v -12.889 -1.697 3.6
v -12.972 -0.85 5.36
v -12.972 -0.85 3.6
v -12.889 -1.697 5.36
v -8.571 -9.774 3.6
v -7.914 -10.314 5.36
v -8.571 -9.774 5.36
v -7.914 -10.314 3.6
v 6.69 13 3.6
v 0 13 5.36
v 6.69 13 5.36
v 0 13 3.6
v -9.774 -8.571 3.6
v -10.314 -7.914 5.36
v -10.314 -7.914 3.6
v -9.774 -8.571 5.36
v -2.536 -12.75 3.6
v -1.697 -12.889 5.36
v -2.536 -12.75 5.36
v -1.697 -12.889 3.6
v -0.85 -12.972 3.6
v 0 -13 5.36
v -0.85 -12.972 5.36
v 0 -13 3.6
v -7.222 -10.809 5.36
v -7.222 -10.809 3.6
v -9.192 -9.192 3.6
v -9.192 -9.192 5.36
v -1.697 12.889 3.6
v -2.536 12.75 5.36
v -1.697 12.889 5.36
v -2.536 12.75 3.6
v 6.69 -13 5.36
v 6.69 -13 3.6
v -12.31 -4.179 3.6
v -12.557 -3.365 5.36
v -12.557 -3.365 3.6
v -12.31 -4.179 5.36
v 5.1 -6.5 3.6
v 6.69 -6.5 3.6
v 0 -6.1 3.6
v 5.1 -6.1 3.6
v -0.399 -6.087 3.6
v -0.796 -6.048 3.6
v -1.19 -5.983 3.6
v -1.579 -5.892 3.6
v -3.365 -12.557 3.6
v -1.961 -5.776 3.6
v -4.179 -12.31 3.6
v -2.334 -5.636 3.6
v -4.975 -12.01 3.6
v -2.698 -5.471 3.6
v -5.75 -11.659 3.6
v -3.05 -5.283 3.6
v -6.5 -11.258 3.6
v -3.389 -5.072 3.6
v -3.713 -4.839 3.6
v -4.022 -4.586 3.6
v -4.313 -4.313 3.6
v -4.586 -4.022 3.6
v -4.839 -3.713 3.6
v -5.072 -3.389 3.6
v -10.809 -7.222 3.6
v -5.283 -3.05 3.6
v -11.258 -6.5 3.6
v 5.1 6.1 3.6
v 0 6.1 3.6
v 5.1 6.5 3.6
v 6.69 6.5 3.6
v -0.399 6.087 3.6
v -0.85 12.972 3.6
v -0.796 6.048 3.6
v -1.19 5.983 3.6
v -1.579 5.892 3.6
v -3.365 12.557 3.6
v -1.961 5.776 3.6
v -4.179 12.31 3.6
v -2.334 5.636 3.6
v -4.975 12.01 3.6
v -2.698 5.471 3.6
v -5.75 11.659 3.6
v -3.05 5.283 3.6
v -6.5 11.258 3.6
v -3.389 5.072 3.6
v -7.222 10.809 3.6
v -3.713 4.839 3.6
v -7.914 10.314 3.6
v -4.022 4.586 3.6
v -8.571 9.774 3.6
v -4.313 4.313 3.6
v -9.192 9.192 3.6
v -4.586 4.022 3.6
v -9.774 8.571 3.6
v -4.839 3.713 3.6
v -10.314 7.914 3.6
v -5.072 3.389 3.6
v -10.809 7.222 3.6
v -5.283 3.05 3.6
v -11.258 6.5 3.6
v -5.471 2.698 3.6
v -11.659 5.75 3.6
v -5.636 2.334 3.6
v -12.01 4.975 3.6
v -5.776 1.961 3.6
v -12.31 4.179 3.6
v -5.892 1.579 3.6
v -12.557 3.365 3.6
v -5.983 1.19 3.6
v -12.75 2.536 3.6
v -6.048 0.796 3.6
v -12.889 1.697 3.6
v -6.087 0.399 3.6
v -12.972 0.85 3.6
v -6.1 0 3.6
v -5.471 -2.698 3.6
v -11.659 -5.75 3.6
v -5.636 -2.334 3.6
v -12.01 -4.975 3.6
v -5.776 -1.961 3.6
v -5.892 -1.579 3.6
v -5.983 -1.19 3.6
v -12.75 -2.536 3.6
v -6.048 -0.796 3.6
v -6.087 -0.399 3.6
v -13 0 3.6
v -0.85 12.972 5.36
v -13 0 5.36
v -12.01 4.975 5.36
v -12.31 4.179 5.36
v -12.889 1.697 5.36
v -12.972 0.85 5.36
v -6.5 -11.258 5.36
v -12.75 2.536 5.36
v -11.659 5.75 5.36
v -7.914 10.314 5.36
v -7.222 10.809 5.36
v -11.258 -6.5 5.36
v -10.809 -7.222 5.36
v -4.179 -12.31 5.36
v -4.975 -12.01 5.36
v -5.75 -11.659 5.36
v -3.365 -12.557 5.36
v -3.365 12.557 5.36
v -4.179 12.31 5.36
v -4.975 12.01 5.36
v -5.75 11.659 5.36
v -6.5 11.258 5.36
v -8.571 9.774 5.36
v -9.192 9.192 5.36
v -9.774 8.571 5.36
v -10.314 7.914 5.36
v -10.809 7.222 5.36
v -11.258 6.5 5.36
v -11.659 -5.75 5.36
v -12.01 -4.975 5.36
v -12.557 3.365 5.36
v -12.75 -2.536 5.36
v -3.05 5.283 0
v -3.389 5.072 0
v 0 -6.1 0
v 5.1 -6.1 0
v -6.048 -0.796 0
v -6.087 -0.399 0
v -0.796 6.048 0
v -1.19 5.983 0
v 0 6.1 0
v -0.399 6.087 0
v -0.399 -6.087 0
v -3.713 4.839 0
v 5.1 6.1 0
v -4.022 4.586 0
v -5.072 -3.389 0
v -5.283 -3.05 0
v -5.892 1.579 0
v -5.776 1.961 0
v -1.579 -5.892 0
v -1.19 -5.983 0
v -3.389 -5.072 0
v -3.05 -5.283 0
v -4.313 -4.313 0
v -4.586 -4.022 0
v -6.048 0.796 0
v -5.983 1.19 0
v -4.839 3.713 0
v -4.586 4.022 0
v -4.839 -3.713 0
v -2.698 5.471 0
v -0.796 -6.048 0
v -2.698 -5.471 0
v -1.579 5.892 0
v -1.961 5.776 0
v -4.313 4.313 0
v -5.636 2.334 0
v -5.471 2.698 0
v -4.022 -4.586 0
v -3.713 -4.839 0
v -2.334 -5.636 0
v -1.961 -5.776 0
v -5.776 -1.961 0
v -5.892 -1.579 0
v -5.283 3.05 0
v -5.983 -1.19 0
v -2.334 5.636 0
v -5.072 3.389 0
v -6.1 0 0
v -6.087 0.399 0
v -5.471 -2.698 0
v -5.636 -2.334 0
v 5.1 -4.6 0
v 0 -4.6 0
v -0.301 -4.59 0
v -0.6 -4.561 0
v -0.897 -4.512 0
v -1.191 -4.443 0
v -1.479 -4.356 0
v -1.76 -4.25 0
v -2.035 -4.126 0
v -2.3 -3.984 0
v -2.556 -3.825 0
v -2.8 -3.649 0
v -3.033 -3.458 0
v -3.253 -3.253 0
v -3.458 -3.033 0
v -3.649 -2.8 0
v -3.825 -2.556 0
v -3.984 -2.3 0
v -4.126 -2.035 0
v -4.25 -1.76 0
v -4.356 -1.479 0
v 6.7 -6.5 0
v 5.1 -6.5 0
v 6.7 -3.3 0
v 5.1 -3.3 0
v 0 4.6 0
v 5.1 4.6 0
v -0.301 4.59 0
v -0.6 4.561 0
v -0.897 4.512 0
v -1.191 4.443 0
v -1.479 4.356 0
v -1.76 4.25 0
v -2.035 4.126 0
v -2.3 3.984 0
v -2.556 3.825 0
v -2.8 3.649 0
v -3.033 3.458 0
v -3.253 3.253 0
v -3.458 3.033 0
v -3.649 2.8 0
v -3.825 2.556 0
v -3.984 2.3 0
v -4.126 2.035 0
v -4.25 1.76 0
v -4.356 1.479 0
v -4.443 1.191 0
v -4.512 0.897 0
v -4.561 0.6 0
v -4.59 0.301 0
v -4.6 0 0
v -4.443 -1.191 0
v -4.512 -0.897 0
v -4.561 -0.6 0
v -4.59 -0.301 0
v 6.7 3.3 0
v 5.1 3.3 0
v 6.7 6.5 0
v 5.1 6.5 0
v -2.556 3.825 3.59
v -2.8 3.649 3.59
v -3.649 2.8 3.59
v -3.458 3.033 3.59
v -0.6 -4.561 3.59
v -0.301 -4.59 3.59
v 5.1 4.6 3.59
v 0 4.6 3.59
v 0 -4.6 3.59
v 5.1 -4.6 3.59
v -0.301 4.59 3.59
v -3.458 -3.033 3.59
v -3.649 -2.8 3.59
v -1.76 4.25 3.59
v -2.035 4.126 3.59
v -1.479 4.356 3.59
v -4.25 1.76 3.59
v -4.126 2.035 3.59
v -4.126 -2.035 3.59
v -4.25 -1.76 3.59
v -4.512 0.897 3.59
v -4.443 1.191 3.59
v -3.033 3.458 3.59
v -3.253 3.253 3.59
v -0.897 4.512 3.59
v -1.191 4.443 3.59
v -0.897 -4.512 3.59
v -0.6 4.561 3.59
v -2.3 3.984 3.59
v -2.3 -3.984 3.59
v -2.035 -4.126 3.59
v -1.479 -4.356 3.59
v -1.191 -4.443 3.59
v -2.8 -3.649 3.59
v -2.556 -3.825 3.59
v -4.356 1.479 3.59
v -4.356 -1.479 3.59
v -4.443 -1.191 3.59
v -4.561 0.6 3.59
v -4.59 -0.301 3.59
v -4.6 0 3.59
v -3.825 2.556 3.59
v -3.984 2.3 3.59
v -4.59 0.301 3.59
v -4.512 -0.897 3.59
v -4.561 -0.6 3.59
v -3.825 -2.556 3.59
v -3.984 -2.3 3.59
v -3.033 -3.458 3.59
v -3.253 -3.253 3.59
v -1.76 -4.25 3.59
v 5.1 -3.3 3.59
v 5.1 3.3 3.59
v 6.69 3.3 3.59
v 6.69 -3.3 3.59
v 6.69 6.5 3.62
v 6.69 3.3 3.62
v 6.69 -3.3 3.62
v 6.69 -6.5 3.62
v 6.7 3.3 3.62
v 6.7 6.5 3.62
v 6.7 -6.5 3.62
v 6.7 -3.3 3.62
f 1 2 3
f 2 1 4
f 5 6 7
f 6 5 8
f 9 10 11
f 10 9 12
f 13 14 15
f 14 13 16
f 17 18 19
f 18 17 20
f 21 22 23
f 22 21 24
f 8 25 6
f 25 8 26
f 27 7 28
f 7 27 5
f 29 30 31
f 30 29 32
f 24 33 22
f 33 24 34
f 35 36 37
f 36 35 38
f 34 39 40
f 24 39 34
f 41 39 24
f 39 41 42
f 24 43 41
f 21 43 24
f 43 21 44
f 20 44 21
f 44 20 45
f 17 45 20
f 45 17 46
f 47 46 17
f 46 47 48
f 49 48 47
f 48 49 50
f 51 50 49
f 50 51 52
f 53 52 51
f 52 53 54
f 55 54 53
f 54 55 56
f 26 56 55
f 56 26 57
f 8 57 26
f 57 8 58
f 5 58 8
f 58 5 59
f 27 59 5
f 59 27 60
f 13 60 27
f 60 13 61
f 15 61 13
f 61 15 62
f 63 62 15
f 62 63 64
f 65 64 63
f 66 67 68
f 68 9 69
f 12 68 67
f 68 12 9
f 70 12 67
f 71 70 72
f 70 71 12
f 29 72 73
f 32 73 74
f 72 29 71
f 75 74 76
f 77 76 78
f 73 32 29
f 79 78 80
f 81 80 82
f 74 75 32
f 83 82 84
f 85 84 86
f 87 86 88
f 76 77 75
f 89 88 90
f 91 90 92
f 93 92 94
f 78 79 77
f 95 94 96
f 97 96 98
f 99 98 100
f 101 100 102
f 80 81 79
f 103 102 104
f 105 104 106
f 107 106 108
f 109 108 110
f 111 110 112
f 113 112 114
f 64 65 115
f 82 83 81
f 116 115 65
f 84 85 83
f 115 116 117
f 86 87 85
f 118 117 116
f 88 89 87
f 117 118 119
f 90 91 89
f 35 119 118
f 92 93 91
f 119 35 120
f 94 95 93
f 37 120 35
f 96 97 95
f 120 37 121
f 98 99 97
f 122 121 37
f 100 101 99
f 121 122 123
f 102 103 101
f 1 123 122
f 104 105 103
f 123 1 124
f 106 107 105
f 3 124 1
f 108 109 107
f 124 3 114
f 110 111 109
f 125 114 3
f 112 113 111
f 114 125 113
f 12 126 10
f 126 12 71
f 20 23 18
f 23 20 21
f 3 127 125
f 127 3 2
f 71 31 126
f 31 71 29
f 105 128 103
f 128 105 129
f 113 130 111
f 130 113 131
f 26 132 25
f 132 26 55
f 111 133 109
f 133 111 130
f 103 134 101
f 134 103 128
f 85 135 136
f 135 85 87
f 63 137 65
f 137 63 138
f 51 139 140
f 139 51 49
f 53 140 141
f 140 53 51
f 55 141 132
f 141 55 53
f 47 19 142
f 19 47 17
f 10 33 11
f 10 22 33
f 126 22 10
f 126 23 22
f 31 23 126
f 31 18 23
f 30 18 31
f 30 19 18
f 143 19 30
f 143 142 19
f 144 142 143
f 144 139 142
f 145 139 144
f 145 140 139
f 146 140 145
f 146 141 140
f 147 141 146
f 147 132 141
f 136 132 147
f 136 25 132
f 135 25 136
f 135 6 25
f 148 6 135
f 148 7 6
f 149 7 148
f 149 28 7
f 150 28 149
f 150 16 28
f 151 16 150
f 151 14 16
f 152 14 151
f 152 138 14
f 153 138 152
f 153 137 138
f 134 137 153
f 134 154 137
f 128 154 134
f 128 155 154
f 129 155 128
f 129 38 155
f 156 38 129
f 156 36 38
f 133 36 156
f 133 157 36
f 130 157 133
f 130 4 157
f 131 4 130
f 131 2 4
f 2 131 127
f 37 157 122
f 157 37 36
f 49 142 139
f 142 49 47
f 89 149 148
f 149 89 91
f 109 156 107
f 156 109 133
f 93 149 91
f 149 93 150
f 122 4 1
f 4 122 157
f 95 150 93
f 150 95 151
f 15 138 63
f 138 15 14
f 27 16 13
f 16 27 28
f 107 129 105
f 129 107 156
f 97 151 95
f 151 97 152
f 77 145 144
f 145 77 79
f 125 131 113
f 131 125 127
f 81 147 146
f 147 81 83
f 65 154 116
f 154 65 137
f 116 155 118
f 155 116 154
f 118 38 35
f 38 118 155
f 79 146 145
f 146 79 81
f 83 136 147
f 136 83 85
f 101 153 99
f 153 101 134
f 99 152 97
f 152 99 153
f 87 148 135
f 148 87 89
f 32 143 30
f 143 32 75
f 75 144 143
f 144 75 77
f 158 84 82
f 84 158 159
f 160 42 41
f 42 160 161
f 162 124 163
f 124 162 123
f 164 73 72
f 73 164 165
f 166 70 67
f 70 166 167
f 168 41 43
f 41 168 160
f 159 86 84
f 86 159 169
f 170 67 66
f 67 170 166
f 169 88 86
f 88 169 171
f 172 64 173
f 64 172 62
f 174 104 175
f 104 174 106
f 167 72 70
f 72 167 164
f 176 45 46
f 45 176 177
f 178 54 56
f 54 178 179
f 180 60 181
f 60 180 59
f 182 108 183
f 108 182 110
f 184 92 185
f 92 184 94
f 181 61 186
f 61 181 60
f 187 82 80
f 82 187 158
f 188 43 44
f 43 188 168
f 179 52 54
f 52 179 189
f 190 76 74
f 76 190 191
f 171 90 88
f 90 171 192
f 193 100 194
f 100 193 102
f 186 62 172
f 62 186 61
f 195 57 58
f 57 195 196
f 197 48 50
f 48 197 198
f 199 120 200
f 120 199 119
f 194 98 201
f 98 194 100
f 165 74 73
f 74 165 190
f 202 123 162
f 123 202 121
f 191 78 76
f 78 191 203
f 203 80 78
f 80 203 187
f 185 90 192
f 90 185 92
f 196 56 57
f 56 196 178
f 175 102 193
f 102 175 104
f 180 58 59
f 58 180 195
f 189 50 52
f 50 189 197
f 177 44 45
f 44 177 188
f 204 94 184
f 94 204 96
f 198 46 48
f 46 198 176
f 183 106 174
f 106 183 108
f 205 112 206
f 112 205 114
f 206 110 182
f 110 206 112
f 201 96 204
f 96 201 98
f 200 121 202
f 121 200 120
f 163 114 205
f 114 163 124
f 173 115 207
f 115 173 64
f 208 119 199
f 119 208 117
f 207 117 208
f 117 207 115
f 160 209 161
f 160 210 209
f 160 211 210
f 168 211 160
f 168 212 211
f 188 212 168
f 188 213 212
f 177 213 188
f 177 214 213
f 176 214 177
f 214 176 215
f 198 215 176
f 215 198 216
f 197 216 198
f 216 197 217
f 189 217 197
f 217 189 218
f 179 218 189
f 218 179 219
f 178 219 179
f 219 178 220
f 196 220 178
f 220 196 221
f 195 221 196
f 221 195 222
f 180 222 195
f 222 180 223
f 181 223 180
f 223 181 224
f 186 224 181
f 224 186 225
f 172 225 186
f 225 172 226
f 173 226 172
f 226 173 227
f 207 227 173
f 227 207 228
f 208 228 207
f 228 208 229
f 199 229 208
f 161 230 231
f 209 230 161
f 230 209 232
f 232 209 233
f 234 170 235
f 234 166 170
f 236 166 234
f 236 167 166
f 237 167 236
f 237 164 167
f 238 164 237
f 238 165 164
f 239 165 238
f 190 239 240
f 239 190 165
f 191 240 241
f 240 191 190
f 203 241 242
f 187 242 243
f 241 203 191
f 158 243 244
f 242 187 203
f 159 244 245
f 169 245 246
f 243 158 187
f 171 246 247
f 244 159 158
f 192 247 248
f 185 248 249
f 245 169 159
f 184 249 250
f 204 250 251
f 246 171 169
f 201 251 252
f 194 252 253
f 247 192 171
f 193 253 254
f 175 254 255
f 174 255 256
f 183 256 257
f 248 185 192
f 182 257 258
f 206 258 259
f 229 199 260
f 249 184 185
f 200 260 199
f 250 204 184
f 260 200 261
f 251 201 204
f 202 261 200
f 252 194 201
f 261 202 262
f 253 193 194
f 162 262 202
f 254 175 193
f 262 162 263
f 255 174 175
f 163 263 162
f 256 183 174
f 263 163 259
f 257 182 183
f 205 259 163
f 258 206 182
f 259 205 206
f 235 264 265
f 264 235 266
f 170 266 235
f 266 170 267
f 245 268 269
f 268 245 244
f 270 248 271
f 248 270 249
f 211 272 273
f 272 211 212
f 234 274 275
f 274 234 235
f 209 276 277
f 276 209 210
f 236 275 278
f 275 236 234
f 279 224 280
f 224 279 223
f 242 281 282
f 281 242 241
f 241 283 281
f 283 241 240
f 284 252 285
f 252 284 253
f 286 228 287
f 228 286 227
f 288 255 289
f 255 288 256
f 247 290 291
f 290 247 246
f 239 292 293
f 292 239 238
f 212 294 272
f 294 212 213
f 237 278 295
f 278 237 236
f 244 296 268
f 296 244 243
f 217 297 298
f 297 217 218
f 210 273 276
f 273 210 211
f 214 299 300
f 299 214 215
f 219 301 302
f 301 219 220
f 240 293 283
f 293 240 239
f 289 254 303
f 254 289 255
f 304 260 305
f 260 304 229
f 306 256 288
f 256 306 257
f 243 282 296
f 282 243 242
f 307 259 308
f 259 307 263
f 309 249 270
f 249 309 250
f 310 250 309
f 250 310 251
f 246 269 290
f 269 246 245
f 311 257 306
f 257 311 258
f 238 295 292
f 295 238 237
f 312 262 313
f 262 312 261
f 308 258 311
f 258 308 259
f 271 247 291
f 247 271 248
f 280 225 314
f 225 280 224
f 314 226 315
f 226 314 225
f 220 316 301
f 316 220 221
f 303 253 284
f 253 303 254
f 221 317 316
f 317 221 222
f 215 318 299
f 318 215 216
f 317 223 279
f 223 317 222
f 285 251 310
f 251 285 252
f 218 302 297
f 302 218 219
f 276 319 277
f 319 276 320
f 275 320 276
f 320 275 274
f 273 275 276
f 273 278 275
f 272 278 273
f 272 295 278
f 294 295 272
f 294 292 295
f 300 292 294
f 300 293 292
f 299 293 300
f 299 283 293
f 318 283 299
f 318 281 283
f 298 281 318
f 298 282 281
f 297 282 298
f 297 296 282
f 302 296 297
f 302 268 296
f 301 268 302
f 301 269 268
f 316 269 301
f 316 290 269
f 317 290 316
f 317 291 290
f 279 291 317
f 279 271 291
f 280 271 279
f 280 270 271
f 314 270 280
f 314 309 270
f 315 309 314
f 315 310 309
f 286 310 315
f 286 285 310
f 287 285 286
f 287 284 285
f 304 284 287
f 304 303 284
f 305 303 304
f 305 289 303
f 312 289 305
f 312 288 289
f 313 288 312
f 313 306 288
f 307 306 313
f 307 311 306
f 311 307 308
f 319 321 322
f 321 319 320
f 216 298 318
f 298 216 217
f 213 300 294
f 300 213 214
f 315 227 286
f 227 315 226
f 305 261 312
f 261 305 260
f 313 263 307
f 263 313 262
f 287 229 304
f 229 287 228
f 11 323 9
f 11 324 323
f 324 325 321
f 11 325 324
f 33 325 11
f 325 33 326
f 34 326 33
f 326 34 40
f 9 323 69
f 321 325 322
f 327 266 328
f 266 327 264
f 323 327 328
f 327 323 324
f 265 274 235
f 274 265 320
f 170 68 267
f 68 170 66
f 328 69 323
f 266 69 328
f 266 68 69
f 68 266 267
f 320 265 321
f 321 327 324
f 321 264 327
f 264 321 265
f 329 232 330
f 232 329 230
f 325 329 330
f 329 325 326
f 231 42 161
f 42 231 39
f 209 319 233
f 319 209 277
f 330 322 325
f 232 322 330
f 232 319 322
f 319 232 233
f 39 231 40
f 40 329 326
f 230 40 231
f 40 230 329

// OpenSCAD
//  Characters    Behavior
//     //            ignore, comment
//     $fa           minimum angle
//     *             disable
//     !             show only
//     #             highlight / debug
//     %             transparent / background
// http://www.openscad.org/cheatsheet/index.html

// Globals

$fn = 8 * 12;
eps = 0.01;

base_diameter = 170;
base_radius   = base_diameter / 2;
base_height   = 10;

post_diameter = 60;
post_height = 40 - base_height;
post_zbase = -post_height;

hole_diameter = 32;
hole_height = base_height + post_height;
hole_zbase = -post_height;

recess_diameter = 70;
recess_height = 30;
recess_zbase = base_height - recess_height;

notch_diameter = 13;
notch_radius   = notch_diameter / 2;
notch_height   = 3.6;
notch_zbase    = base_height - notch_height;
notch_length   = 30;
notch_per_rotation = 8;
notch_rotation_angle = 360 / notch_per_rotation;
notch_offset_angle = notch_rotation_angle / 2;
notch_inset = base_radius - notch_radius;

// Functions

// Modules

module notch(h, d, l)
{
    hull()
    {
        cylinder(h=h, d=d);
        translate([l, 0, 0])
            cylinder(h=h, d=d);
    }
}

// Objects

union()
{
    difference()
    {
        union()
        {
            translate([0, 0, notch_height])
            notch(h=1.76, d=2*notch_diameter, l=notch_length-notch_radius);

            color("orange")
            notch(notch_height, notch_diameter-0.8, notch_length);
        }

        color("red")
        translate([0, 0, -eps])
        notch(notch_height, 8+1.2, notch_length);

        color("green")
        translate([notch_length-1.81,0, 0])
        cube([notch_length+notch_diameter, 2*(notch_diameter+eps), 12], center=true);
    }

    color("blue")
    translate([notch_radius-0.6, notch_radius-1.6, notch_height/2+eps])
    cube([1.6, 3.2, notch_height+2*eps], center=true);

    color("blue")
    translate([notch_radius-0.6, -(notch_radius-1.6), notch_height/2+eps])
    cube([1.6, 3.2, notch_height+2*eps], center=true);
}
